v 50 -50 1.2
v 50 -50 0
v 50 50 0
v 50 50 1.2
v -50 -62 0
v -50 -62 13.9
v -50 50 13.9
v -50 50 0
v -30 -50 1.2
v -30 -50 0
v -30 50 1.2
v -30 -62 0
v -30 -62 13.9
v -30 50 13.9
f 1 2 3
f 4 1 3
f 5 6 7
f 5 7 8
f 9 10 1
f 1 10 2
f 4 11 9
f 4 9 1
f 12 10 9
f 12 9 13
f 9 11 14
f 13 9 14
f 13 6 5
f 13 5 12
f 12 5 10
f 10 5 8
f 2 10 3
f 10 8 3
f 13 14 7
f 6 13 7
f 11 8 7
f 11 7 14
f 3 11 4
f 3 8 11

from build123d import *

# Parameters (mm, degrees)
F0_W     = 100
F0_H     = 100
F1_DEPTH = 1.2
F2_W     = 20
F2_H     = 100
F3_DEPTH = 12.7
F5_DEPTH = 12


with BuildPart() as f1:
    # F0 (on Top) → F1 (new body)
    with BuildSketch(Plane.XY):
        Rectangle(F0_W, F0_H)
    extrude(amount=F1_DEPTH)

    # F2 (on face) → F3 (join)
    with BuildSketch(Plane.XY.offset(1.2)):
        with Locations((-40, 0)):
            Rectangle(F2_W, F2_H)
    extrude(amount=F3_DEPTH)

    # F4 (on face) → F5 (join)
    with BuildSketch(Plane.XZ.offset(50)):
        Polygon((-30, 13.9), (-50, 13.9), (-50, 0), (-30, 0), (-30, 1.2), align=None)
    extrude(amount=F5_DEPTH)


solid = f1.part
